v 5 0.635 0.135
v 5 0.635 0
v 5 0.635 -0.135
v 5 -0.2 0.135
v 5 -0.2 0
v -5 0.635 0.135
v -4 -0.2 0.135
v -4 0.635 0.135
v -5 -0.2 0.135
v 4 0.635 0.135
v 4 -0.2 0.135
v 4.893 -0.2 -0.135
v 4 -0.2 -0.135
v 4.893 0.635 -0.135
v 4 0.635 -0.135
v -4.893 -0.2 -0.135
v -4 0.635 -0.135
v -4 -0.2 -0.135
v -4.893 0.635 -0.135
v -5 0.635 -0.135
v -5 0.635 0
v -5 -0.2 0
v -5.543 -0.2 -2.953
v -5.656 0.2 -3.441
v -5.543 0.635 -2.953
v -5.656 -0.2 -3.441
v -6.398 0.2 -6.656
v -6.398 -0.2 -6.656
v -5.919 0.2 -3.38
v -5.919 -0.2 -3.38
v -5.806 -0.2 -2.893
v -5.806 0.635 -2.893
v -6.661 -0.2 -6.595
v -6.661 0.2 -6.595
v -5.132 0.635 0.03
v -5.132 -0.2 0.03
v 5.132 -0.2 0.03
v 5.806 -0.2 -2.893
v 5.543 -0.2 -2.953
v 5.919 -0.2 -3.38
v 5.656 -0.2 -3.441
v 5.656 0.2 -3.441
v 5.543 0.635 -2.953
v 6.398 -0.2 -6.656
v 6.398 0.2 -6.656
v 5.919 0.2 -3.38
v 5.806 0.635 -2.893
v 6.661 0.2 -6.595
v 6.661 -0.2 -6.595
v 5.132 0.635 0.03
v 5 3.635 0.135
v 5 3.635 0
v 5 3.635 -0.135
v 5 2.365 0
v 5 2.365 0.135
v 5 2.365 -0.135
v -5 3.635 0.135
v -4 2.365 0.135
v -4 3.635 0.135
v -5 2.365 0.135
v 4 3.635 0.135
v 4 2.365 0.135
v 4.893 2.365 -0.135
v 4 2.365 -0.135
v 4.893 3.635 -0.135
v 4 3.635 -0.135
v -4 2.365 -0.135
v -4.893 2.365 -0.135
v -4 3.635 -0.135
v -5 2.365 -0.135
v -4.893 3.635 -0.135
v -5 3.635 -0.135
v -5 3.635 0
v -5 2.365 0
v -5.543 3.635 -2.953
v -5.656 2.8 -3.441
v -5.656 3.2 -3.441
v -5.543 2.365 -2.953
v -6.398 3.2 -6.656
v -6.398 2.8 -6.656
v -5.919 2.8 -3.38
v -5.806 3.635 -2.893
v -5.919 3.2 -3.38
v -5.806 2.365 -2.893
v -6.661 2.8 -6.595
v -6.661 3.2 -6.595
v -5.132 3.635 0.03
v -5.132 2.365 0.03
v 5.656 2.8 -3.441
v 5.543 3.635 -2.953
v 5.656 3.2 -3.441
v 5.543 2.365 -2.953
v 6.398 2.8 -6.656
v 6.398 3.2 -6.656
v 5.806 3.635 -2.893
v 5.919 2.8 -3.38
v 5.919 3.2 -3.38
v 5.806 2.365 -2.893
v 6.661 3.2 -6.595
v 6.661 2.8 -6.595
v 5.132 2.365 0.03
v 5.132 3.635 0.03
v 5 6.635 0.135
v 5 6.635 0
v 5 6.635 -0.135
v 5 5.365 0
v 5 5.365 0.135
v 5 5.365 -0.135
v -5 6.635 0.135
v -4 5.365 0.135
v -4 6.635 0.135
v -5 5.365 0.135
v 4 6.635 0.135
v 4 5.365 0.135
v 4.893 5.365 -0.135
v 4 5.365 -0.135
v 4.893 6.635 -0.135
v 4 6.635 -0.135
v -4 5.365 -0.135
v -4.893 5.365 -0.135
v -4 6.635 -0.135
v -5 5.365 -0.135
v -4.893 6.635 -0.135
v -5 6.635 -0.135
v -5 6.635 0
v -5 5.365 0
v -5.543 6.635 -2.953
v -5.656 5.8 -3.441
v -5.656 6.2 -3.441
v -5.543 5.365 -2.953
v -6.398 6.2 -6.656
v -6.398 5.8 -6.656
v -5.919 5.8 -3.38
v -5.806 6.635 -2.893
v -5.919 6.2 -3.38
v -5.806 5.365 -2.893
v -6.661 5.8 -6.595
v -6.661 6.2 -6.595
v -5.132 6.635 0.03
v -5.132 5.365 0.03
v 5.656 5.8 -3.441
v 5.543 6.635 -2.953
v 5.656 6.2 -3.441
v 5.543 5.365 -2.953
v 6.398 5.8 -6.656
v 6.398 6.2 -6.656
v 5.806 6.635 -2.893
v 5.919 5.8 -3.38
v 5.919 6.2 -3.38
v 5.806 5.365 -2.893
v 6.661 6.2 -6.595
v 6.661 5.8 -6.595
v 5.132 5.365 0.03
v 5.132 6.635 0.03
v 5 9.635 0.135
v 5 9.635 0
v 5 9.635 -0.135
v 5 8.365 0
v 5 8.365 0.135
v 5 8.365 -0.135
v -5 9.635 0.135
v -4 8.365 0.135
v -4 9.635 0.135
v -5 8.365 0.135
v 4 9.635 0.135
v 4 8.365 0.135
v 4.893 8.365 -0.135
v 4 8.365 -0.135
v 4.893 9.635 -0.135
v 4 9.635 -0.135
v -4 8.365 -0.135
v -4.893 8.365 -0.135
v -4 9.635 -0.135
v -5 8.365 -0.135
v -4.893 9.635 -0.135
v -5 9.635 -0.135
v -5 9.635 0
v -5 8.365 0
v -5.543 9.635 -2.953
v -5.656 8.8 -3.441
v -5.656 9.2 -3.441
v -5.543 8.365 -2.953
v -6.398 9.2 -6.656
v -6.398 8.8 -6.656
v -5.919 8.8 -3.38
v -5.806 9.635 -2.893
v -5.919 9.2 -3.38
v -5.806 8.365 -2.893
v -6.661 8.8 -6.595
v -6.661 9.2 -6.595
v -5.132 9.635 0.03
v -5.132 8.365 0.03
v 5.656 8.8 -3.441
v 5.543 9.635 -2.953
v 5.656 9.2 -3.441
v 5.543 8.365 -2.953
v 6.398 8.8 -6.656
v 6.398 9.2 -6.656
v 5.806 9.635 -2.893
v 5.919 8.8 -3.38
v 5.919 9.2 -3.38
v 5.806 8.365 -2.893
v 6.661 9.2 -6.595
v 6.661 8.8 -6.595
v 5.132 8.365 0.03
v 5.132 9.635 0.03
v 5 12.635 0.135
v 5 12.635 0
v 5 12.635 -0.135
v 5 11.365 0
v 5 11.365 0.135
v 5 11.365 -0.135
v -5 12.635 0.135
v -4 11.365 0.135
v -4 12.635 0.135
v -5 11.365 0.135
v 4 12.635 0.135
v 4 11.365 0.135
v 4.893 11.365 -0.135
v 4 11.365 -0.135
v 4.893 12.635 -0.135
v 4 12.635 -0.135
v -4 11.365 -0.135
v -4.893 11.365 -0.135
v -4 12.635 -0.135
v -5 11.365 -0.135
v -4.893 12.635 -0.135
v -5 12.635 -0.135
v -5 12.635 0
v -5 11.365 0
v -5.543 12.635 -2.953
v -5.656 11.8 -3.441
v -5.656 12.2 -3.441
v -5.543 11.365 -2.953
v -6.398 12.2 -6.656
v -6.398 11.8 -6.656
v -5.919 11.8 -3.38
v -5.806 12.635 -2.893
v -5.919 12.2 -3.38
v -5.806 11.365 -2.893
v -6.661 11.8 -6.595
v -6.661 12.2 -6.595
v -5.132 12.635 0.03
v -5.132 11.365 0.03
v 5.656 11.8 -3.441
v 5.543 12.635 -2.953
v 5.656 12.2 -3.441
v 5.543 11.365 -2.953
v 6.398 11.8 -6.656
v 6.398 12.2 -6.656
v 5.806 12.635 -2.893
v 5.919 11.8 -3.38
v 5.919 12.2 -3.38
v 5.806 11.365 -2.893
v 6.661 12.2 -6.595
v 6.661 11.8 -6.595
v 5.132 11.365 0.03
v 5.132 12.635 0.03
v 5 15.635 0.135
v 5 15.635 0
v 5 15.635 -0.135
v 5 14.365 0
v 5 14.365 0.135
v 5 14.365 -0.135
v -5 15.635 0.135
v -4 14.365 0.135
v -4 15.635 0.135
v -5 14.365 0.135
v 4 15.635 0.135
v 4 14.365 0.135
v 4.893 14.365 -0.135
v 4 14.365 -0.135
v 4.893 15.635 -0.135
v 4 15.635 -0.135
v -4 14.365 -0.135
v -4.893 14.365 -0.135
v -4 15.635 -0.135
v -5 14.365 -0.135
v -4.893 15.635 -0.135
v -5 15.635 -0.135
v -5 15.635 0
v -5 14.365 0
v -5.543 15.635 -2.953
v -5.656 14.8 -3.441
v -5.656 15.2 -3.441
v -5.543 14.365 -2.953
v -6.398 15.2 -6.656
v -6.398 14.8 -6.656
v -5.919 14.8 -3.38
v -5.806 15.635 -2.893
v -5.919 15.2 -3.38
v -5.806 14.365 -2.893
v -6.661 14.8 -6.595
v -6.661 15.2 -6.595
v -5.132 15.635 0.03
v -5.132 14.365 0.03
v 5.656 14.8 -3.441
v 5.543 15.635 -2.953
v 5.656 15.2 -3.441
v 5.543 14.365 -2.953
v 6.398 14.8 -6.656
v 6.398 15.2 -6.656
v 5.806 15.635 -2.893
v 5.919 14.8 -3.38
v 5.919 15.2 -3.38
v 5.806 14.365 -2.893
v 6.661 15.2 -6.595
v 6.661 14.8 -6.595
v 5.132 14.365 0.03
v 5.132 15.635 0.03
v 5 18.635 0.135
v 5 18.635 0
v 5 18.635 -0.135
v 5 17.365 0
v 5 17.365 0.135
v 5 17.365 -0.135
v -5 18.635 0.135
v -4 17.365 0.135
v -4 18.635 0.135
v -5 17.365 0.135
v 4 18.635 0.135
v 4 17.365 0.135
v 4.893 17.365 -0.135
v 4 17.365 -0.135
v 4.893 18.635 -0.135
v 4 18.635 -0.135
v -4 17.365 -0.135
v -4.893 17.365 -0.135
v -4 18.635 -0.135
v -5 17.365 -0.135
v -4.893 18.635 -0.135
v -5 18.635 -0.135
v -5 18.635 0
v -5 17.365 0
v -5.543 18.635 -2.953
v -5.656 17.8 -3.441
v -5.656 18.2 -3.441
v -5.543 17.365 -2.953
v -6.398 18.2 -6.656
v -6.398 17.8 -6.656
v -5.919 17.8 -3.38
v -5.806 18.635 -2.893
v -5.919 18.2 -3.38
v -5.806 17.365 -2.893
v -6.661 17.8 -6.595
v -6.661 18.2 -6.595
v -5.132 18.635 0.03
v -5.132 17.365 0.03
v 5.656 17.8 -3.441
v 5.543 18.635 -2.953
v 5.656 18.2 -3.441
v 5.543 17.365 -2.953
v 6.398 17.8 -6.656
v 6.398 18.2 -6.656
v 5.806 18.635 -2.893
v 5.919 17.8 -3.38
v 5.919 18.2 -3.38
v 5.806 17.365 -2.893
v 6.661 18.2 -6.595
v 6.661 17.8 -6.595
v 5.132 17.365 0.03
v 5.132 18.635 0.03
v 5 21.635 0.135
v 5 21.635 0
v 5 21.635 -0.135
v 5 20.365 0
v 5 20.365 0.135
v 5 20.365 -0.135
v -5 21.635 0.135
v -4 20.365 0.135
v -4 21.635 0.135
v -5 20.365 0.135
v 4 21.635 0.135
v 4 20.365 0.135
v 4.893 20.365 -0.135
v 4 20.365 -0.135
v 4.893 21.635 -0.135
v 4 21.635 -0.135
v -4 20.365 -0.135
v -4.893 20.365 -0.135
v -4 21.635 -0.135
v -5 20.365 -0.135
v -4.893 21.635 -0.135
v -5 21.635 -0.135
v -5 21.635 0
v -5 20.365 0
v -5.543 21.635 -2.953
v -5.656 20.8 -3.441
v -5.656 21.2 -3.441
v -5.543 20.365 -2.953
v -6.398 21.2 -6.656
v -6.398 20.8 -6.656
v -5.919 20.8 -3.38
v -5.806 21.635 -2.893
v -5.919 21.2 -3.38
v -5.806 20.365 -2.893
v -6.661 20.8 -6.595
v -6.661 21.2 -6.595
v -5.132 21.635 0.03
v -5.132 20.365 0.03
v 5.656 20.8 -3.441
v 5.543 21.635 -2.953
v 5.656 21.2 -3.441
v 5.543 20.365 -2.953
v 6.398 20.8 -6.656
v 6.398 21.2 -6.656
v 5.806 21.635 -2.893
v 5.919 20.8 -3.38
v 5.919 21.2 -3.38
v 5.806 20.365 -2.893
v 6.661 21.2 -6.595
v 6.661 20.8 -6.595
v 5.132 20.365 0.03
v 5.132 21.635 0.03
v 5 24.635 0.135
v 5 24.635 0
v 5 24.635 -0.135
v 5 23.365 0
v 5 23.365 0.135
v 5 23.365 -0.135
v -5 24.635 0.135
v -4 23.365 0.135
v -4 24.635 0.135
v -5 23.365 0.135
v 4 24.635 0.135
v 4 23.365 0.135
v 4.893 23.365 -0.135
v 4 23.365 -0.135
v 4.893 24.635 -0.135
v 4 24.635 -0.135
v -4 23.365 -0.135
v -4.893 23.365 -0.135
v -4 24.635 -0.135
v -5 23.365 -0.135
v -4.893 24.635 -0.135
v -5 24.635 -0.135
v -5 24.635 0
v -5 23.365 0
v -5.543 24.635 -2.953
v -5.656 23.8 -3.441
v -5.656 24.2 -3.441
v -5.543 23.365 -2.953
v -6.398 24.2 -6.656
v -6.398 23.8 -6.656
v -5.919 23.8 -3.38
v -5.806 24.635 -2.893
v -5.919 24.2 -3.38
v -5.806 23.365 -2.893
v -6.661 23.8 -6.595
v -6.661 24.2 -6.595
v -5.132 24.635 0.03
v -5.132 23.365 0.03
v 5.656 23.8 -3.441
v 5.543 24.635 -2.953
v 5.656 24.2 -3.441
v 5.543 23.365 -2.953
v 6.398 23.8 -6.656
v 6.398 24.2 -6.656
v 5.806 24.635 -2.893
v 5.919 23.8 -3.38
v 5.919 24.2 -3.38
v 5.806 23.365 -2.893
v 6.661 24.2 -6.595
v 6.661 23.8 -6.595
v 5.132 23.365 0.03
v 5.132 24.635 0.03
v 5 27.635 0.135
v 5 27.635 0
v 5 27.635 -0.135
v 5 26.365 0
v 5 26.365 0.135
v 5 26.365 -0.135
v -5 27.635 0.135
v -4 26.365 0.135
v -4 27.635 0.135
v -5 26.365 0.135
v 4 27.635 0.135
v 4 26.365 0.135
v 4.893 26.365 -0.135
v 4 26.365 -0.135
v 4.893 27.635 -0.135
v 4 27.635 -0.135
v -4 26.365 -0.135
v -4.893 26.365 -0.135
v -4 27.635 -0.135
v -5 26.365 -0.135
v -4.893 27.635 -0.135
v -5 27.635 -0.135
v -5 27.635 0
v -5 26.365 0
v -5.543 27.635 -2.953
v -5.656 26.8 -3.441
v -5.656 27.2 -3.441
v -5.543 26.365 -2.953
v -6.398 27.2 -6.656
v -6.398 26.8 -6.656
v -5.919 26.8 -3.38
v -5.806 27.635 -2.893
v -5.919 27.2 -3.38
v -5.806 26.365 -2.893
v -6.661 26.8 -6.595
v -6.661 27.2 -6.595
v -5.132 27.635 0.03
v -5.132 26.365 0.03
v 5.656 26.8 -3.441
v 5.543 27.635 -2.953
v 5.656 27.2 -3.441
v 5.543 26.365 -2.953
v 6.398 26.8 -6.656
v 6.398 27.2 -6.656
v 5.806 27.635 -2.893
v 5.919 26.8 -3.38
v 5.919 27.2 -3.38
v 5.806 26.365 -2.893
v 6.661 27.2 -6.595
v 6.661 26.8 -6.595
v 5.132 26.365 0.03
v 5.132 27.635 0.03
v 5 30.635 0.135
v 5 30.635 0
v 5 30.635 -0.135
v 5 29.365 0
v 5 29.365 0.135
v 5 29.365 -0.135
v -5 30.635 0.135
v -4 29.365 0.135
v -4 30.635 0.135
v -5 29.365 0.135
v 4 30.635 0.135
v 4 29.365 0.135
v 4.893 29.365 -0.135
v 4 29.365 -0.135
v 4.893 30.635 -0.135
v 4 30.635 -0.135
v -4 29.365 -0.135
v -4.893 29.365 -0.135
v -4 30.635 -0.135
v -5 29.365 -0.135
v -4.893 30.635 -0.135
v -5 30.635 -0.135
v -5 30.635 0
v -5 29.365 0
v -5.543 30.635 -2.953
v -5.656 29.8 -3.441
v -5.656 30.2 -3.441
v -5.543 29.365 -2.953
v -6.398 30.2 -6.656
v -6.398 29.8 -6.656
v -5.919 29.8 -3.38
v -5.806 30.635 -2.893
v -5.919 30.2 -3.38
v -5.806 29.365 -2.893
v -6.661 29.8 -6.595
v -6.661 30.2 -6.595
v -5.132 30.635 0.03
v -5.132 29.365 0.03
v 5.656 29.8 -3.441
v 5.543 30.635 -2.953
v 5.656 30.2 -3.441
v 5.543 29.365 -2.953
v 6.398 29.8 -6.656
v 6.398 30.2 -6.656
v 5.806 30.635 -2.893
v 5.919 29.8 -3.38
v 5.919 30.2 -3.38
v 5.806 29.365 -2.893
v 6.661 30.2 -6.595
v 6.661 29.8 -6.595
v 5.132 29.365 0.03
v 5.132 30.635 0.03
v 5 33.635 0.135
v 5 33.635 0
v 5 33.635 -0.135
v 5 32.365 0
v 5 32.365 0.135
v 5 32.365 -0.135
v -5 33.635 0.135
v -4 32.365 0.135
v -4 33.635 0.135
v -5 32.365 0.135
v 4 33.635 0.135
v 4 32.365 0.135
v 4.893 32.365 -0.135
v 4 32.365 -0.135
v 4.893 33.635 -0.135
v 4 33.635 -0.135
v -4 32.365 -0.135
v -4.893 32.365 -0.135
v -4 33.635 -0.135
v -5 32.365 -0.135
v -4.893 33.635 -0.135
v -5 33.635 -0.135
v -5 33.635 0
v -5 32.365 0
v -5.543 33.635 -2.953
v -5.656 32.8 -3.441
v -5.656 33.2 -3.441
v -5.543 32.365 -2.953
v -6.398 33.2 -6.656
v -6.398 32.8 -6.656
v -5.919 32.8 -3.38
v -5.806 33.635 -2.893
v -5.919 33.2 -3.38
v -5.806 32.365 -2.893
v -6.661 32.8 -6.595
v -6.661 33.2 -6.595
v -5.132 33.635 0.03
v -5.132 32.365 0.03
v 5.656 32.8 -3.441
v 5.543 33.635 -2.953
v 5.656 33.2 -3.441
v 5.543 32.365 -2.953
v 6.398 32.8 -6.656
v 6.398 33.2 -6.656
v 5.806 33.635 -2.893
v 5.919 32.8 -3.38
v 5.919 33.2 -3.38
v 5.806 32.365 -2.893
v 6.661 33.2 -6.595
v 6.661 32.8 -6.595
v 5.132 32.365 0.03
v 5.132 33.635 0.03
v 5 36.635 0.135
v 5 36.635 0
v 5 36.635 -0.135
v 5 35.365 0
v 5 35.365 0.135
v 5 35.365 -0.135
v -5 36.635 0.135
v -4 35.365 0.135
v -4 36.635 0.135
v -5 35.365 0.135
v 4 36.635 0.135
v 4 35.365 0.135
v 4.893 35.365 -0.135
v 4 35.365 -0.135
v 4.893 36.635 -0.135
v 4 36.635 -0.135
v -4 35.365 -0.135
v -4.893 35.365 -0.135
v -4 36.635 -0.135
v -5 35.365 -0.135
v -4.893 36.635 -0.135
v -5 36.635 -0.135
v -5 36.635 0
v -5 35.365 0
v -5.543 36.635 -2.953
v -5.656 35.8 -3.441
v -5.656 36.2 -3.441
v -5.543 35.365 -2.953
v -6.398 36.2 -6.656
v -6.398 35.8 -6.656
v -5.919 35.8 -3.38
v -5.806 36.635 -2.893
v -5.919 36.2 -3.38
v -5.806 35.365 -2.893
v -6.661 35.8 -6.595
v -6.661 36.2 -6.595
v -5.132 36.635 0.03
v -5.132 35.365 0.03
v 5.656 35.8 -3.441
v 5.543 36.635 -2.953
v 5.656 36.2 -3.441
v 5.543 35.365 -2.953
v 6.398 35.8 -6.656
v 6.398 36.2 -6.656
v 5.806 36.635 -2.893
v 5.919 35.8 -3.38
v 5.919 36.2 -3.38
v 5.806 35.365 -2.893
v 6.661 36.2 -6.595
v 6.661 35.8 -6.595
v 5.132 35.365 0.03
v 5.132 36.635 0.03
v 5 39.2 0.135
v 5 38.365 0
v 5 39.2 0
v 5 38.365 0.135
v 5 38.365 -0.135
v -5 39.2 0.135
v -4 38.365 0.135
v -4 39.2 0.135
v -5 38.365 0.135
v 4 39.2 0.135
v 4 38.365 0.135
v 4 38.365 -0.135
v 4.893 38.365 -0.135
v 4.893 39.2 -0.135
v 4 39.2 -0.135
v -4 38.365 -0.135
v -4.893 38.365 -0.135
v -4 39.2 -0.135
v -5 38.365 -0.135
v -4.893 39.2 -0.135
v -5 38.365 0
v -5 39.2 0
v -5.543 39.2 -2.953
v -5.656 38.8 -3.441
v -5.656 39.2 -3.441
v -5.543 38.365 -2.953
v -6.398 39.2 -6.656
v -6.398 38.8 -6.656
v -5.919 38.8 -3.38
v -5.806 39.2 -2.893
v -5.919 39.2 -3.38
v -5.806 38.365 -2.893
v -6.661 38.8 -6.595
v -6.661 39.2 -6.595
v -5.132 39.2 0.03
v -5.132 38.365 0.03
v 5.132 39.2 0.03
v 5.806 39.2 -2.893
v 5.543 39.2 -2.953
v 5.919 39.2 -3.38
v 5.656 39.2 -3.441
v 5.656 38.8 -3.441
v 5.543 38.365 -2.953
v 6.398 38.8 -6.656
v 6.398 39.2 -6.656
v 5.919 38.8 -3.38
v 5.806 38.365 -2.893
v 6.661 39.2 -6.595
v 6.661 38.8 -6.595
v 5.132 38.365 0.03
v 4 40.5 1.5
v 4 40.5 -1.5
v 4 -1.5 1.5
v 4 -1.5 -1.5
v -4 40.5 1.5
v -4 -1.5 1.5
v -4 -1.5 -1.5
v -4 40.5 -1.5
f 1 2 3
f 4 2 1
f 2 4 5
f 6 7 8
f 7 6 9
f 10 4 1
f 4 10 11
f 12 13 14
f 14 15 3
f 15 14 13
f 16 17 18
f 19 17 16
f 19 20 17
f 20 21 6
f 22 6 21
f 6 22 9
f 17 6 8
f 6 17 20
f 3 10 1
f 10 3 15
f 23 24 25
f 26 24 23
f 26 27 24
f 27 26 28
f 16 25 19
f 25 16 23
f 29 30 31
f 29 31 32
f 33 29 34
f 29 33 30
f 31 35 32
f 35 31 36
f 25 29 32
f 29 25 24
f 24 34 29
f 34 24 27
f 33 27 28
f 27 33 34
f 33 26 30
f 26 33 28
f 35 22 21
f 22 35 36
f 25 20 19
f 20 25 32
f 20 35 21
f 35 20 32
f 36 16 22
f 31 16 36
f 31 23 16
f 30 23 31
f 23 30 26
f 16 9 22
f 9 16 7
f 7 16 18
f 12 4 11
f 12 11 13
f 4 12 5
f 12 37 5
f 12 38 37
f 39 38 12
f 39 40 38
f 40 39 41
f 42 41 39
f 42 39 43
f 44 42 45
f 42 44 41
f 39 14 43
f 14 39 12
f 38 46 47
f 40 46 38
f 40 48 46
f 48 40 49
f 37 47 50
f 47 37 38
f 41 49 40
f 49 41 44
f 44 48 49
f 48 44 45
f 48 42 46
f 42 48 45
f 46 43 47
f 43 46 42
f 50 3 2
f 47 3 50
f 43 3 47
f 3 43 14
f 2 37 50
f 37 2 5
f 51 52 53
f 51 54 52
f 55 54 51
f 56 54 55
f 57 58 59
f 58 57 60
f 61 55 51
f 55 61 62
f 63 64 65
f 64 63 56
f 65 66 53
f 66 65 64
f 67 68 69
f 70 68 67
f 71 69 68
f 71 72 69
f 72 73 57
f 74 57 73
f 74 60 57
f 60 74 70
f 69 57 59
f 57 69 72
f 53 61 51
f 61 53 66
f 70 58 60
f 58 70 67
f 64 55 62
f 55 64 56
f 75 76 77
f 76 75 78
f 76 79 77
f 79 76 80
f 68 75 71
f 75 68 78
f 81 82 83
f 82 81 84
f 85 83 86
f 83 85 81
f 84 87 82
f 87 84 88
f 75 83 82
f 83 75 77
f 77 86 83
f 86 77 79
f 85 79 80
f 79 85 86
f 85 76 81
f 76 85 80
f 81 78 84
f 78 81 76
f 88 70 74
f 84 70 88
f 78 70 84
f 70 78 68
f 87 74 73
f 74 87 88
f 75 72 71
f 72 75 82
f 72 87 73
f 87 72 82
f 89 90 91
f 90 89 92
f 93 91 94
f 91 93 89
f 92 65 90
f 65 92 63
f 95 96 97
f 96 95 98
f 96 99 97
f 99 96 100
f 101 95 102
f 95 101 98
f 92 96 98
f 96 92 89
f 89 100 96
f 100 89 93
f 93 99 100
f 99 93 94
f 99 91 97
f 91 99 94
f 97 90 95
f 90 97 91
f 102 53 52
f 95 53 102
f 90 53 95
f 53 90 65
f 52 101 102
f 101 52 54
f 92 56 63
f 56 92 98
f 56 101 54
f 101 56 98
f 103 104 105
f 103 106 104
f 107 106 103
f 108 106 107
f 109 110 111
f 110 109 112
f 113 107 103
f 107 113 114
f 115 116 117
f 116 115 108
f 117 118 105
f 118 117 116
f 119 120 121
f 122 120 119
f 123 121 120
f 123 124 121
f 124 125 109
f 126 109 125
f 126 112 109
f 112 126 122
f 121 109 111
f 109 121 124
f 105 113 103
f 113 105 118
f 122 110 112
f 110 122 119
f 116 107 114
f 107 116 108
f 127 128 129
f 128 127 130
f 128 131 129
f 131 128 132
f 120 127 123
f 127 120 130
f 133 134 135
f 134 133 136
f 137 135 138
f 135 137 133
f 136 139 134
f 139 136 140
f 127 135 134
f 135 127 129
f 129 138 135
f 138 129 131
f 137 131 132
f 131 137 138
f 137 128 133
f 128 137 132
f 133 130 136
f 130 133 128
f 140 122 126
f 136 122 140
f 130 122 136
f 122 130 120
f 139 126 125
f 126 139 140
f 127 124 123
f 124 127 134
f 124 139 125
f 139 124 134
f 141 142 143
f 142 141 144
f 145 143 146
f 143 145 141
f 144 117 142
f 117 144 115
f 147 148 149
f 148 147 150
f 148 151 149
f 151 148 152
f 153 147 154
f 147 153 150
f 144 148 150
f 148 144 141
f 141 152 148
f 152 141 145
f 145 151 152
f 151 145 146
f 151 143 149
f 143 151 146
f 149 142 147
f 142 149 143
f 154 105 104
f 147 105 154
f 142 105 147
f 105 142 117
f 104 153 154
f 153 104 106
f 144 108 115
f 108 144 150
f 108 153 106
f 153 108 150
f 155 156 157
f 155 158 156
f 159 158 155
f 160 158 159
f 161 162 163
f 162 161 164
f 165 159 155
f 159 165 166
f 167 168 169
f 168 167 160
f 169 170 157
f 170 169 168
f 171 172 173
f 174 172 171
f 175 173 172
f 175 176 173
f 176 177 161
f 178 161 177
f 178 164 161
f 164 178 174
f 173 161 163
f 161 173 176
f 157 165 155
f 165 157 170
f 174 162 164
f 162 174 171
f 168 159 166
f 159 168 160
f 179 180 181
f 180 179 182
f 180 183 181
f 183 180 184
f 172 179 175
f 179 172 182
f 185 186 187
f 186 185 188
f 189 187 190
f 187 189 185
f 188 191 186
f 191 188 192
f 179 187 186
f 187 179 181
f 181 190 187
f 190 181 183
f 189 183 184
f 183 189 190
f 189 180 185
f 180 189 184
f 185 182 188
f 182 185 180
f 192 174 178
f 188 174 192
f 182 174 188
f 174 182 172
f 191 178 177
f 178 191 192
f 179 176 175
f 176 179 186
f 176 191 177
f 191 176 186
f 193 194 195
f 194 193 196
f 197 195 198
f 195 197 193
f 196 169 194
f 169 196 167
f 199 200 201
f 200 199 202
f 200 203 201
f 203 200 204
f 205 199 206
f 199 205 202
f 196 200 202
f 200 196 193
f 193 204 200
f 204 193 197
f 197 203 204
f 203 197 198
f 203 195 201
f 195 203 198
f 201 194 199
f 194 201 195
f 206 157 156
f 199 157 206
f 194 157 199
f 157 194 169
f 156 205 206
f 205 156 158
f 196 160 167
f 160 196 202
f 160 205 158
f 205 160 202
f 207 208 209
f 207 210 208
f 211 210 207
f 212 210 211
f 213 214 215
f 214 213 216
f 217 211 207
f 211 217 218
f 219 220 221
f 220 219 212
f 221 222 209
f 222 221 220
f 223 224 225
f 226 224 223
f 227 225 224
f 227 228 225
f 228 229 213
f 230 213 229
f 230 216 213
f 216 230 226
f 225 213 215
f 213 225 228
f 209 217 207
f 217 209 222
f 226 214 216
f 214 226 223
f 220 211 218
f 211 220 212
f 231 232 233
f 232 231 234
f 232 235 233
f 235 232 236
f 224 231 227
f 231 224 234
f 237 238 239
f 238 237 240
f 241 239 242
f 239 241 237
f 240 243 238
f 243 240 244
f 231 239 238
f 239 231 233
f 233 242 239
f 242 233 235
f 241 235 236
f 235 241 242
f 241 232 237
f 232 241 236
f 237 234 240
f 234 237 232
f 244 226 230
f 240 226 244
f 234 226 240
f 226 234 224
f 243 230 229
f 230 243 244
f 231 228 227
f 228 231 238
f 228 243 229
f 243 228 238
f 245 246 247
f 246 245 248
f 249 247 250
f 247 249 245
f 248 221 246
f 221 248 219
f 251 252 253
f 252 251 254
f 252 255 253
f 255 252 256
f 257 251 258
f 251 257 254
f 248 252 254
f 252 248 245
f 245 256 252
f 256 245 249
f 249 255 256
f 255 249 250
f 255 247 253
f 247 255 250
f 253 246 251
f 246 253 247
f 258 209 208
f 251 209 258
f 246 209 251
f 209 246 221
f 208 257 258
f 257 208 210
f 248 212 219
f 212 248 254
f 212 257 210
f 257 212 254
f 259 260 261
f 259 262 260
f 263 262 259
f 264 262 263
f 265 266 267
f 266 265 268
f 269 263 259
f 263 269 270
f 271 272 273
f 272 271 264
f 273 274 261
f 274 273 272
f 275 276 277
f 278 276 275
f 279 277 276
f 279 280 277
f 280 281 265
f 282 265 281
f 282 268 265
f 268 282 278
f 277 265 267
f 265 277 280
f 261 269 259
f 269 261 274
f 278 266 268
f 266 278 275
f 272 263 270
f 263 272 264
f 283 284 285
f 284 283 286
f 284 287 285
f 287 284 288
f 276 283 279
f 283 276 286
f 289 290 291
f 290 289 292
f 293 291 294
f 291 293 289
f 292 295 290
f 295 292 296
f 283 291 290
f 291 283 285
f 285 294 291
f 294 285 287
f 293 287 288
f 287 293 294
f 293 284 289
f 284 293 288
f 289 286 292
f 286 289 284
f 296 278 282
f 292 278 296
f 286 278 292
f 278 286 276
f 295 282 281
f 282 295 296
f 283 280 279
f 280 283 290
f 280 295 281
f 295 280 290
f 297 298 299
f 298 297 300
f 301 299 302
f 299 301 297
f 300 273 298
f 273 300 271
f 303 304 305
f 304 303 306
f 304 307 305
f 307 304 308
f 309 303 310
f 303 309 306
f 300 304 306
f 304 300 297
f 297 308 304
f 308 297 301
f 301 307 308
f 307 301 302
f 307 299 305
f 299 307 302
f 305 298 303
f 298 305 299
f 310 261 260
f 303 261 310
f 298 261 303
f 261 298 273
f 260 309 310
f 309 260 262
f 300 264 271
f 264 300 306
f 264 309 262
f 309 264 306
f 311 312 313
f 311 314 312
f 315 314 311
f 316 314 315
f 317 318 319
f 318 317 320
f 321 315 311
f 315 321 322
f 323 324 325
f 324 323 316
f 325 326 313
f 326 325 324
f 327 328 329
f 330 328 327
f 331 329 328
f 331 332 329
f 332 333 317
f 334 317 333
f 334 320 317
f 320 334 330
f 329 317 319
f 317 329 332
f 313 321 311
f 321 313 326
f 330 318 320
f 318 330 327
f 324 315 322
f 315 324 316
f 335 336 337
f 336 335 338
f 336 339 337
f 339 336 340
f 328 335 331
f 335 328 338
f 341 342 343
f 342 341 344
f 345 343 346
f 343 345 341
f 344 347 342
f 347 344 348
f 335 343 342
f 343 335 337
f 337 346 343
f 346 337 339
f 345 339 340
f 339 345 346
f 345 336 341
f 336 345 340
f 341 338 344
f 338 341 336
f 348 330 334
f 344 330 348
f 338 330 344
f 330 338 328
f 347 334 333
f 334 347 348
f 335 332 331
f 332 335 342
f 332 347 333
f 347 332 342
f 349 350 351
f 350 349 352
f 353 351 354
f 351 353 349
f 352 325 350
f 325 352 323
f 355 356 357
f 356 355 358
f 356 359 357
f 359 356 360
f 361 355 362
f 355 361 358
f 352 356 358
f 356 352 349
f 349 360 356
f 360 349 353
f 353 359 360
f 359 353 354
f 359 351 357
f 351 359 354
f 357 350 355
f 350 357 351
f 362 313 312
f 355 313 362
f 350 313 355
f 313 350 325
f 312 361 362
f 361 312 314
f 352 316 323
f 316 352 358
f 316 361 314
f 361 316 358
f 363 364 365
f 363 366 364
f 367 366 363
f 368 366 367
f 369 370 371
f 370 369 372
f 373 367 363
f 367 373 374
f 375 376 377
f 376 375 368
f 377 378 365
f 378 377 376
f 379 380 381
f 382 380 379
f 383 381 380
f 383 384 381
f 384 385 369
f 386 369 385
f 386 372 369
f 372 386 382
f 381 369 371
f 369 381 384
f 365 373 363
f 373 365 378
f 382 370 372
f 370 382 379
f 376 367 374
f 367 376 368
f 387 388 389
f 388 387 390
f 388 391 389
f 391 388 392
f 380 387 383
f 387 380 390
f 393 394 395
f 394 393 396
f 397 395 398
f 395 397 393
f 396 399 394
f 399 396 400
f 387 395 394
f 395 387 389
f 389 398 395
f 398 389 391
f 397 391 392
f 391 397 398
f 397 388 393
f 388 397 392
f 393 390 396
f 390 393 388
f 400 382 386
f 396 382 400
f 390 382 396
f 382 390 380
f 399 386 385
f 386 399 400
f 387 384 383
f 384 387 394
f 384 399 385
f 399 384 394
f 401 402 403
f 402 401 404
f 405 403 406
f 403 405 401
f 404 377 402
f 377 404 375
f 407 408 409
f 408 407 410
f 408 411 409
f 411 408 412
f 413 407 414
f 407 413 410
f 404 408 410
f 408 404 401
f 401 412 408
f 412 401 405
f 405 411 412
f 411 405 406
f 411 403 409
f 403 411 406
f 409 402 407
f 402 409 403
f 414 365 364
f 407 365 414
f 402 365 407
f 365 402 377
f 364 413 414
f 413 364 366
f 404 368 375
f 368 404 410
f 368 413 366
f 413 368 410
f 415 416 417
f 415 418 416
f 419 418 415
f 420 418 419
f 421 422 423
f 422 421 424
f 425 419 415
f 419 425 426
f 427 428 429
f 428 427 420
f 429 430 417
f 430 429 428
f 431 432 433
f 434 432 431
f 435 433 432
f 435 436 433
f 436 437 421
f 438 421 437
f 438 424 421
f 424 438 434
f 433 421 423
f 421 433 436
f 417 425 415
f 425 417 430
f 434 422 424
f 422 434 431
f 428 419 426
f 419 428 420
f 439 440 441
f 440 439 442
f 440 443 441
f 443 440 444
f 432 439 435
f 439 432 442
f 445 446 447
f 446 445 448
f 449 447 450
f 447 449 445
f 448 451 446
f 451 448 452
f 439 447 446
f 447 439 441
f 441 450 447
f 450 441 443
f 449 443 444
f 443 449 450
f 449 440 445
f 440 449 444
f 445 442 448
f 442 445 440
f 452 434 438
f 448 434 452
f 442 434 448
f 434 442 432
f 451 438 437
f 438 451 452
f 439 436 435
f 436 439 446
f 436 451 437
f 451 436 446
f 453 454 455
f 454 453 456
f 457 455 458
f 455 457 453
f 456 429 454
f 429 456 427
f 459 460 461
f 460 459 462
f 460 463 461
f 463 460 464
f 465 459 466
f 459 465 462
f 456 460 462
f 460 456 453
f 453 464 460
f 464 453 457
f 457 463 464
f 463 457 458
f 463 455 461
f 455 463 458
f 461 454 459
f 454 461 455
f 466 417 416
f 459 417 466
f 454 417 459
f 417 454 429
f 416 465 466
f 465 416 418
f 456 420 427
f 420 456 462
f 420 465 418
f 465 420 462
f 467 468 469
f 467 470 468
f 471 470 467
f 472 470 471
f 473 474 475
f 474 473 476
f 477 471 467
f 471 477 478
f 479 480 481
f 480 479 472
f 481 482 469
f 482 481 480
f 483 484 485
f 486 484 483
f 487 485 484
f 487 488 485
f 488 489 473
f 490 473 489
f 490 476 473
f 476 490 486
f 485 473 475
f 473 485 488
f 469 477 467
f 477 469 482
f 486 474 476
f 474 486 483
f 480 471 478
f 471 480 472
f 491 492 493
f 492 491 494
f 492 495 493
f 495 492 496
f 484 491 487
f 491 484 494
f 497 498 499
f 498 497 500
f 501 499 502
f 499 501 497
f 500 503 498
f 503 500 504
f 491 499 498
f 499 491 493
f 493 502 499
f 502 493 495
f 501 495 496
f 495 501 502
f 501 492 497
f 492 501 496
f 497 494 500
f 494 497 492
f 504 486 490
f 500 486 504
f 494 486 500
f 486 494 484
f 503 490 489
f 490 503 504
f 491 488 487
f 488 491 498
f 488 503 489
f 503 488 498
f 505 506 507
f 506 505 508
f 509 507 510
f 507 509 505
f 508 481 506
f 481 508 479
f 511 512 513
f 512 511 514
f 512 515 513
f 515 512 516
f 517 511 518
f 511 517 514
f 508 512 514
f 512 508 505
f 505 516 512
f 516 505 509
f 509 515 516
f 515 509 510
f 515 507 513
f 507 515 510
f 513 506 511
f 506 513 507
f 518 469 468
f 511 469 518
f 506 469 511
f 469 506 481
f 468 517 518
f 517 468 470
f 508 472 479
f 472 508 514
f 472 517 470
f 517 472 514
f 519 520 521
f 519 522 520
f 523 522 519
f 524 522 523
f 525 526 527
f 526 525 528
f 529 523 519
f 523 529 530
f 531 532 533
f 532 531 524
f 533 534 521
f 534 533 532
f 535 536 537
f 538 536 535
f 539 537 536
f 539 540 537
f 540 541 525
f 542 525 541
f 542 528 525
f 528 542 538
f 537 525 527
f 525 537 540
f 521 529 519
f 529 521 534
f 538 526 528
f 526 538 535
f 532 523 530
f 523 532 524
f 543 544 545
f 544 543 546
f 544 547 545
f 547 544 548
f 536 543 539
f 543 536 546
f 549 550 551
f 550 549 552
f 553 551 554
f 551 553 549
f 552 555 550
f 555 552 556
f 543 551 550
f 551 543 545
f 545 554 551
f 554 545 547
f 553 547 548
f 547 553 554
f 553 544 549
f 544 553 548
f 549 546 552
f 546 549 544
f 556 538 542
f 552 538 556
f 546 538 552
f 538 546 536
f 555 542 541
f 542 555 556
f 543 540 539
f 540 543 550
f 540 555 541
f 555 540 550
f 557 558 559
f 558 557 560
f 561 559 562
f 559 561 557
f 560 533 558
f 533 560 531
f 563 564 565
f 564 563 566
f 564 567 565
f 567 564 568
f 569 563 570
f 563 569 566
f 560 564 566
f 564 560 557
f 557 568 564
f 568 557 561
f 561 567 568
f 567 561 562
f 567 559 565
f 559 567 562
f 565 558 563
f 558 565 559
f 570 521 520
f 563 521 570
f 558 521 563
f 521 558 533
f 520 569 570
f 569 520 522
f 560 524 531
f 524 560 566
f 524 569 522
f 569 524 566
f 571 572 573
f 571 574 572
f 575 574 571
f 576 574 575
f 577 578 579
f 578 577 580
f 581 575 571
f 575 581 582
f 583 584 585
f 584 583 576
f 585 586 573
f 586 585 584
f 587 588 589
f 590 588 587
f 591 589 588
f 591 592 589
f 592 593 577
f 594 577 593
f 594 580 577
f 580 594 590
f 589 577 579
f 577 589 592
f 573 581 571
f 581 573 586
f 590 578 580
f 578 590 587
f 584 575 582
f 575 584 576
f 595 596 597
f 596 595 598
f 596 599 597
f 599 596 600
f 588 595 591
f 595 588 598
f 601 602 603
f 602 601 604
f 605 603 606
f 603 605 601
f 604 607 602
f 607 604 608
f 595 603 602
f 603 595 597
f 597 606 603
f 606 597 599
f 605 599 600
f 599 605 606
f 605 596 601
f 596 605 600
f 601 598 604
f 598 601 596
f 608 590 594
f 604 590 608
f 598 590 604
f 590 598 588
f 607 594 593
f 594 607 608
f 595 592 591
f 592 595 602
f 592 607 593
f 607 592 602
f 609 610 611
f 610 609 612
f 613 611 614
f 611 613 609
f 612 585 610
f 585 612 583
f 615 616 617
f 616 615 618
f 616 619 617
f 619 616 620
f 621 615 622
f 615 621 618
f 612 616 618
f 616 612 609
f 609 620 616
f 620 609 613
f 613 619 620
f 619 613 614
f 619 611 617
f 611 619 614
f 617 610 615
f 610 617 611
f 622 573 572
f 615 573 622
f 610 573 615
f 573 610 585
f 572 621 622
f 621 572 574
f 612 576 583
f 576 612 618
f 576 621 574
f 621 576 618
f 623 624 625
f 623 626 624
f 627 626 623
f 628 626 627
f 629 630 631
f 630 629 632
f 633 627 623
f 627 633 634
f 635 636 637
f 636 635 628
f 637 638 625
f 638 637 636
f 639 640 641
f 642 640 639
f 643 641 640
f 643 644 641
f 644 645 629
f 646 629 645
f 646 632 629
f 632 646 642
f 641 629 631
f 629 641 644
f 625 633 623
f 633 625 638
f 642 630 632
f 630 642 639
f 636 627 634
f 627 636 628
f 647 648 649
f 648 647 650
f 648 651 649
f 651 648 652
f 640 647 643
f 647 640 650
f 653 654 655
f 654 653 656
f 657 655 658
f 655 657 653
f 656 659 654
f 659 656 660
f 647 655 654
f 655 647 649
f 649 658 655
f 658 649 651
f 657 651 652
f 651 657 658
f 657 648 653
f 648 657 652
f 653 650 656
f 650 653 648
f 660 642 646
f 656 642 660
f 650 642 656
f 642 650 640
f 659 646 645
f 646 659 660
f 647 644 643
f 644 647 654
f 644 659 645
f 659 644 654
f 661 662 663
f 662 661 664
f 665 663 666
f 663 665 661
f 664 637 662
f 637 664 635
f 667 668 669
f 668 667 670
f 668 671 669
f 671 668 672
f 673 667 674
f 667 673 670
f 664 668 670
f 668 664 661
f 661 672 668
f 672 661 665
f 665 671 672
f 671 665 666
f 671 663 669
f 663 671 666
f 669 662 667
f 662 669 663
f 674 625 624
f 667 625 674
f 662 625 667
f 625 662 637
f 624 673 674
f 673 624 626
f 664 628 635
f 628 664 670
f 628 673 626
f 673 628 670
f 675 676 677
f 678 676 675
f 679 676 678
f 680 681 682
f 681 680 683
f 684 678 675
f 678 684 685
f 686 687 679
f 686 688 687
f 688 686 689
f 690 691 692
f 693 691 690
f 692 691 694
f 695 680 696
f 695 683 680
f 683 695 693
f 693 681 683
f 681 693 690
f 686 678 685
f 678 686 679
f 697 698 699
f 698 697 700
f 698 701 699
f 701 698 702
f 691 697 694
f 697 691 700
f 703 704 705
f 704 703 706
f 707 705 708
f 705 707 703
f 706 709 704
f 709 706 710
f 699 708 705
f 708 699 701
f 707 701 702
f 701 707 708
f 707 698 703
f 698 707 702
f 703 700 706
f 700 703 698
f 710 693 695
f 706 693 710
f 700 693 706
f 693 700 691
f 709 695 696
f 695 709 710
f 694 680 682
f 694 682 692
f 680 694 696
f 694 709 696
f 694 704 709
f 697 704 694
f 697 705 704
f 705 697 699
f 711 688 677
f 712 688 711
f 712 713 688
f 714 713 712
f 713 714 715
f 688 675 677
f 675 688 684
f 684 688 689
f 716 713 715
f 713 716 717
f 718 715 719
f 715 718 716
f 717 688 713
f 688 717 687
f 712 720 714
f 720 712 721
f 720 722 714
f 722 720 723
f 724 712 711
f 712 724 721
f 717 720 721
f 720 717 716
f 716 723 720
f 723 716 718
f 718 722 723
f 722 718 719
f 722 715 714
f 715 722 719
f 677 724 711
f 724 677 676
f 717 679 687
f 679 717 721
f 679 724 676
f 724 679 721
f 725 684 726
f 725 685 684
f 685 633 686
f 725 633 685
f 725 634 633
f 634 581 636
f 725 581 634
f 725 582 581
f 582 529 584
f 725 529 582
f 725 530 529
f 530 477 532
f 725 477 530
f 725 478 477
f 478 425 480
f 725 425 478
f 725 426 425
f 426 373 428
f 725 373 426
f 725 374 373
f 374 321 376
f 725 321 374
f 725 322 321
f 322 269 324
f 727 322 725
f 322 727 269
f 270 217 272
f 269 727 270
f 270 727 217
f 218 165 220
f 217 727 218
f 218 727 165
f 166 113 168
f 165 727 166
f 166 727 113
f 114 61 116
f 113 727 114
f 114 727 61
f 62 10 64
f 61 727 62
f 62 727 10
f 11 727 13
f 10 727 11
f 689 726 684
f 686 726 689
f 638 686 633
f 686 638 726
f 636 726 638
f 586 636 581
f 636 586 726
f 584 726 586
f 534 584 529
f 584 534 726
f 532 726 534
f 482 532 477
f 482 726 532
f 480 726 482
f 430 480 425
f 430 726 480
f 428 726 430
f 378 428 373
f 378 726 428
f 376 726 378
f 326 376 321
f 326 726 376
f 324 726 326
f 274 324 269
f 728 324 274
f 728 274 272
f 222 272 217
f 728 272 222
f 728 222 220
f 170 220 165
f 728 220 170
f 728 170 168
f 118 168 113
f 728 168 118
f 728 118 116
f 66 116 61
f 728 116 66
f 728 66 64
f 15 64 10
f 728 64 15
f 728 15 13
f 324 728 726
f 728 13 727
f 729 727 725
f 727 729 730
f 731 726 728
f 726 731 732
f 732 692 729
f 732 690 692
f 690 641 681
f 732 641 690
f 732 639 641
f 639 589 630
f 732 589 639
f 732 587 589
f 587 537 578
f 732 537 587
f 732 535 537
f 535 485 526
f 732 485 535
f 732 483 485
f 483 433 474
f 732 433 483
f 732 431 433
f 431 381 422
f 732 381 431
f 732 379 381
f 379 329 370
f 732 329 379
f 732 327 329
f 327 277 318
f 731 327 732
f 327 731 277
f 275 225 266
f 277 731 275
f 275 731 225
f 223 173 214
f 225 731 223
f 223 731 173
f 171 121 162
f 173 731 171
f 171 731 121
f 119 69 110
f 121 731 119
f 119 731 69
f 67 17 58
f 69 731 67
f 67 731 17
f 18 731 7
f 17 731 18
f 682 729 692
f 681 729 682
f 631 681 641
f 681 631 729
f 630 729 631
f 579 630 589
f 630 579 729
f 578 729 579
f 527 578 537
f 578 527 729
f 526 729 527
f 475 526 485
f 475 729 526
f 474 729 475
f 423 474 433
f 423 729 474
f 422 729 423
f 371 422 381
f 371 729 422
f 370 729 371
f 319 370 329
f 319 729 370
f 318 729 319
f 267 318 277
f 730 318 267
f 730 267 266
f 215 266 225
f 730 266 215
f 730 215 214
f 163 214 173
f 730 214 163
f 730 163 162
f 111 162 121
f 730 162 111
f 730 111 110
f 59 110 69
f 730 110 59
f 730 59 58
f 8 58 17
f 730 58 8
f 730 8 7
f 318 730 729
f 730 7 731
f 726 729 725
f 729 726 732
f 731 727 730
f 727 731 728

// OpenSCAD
resolution = .1;

// There is probably a better way to make this but this works for now
module bend(angle, thickness, wideness, length) {
	angle = angle % 360;
	difference() {
		cylinder(r=length+thickness, h=wideness, center=true, $fs=resolution);
		cylinder(r=length, h=wideness+1, center=true, $fs=resolution);

		difference() {
			rotate([0,0,0]) translate([(thickness+length)/2,(thickness+length)/2,0]) cube([thickness+length,thickness+length,wideness+1], center = true);
			if (angle > 90) {
				rotate([0,0,-angle]) translate([(thickness+length)/2,(thickness+length)/2,0]) cube([thickness+length,thickness+length,wideness+1], center = true);
			}
		}
		if (angle < 360-72)
		difference() {
			rotate([0,0,72]) translate([(thickness+length)/2,(thickness+length)/2,0]) cube([thickness+length,thickness+length,wideness+1], center = true);
			rotate([0,0,-angle]) translate([(thickness+length)/2,(thickness+length)/2,0]) cube([thickness+length,thickness+length,wideness+1], center = true);
		}

		if (angle < 360-144)
		difference() {
			rotate([0,0,144]) translate([(thickness+length)/2,(thickness+length)/2,0]) cube([thickness+length,thickness+length,wideness+1], center = true);
			rotate([0,0,-angle]) translate([(thickness+length)/2,(thickness+length)/2,0]) cube([thickness+length,thickness+length,wideness+1], center = true);
		}

		if (angle < 360-216)
		difference() {
			rotate([0,0,216]) translate([(thickness+length)/2,(thickness+length)/2,0]) cube([thickness+length,thickness+length,wideness+1], center = true);
			rotate([0,0,-angle]) translate([(thickness+length)/2,(thickness+length)/2,0]) cube([thickness+length,thickness+length,wideness+1], center = true);
		}
		if (angle < 360-288)
		difference() {
			rotate([0,0,288]) translate([(thickness+length)/2,(thickness+length)/2,0]) cube([thickness+length,thickness+length,wideness+1], center = true);
			rotate([0,0,-angle]) translate([(thickness+length)/2,(thickness+length)/2,0]) cube([thickness+length,thickness+length,wideness+1], center = true);
		}
	}
}


module pin (angle=13, metalThickness=.27, metalWidth=1.27, pinWidth=.4, pinlength=3.3, metalLength = 4, angleLength = .5, chopleft=0, chopright=0) {
	sliceangle = 60;


	sliceangle = 90-atan2(angleLength , (metalWidth - pinWidth) / 2 );
	// sliceangle = 0;
	difference () {
		union(){
			cube([10,metalWidth,metalThickness], center=true);
			translate([-5,0,0]){
				
				rotate([0,angle-90,0]) {
					// Fill in the gap caused by rotation with a bent angle
					//rotate([90,-90,0]) bend(90-angle, metalThickness/2, metalWidth, 0);

					// Create the metal top half and angle to the pin
					difference() {
						translate([-(metalLength/2),0,0]) cube([metalLength,metalWidth,metalThickness], center=true);
						translate([-metalLength,(pinWidth)/2 ,-metalThickness]) rotate ([0,0,sliceangle]) cube([metalLength+metalWidth,metalLength+metalWidth,metalThickness+1]);
						translate([-metalLength,-(pinWidth)/2 ,-metalThickness]) rotate ([0,0,270-sliceangle]) cube([metalLength+metalWidth,metalLength+metalWidth,metalThickness+1]);
					}

					// Pin
					translate([-metalLength-(pinlength/2),0,0]) cube([pinlength,pinWidth,metalThickness], center=true);
				}	
			}
		}
		if (chopleft) translate([0,-15-(pinWidth/2),0]) cube([30,30,30], center = true);
		if (chopright) translate([0,15+(pinWidth/2),0]) cube([30,30,30], center = true);
	}
}

module pin2 (angle=13, metalThickness=.27, metalWidth=1.27, pinWidth=.4, pinlength=3.3, metalLength = 3, angleLength = .5, chopleft=0, chopright=0) {
	sliceangle = 60;


	sliceangle = 90-atan2(angleLength , (metalWidth - pinWidth) / 2 );
	// sliceangle = 0;
	difference () {
		union(){
			cube([10,metalWidth,metalThickness], center=true);
			translate([-5,0,0]){
				
				rotate([0,angle-90,0]) {
					// Fill in the gap caused by rotation with a bent angle
					// rotate([90,-90,0]) bend(90-angle, metalThickness/2, metalWidth, 0);

					rotate([0,0,90]) linear_extrude(height=metalThickness, center=true) polygon(points=[[-metalWidth/2,0],[metalWidth/2,0],[metalWidth/2,metalLength],[pinWidth/2, metalLength+angleLength], [pinWidth/2, metalLength+angleLength+pinlength],[-pinWidth/2, metalLength+angleLength+pinlength],[-pinWidth/2, metalLength+angleLength], [-metalWidth/2,metalLength]], paths=[[0,1,2,3,4,5,6,7]]);

				}	
			}
		}
		if (chopleft) translate([0,-15-(pinWidth/2),0]) cube([30,30,30], center = true);
		if (chopright) translate([0,15+(pinWidth/2),0]) cube([30,30,30], center = true);
	}
}

module chip() {
	pincount = 14; // actually the number of pins on one side minus one
	pinspacing = 3;
	pinAngle = 13;

	for ( i = [1 : pincount] )
	{
	    // chopbegin = 0;
	    // chopend = 0;
	    translate([0, (i-1)*pinspacing, 0]) {
		    color("gray") rotate([0,0,0]) pin2(angle=pinAngle, chopleft=i==1, chopright=i==pincount);
		    color("gray") rotate([0,0,180]) pin2(angle=pinAngle, chopleft=i==pincount, chopright=i==1);
		}
	}

	casePadding = 3;
	caseLength = (pincount-1) * pinspacing + casePadding;

	color("black") translate([0,caseLength/2 - (casePadding/2),0]) cube([8,caseLength,3], center=true);
}



// module arc() {
// 	steps = 100;
// 	angle = 30;

// 	anglePerStep = angle / steps

// 	for ( i = [0 : steps]) {

// 	}
// }



// arc

// pin2();

chip();
